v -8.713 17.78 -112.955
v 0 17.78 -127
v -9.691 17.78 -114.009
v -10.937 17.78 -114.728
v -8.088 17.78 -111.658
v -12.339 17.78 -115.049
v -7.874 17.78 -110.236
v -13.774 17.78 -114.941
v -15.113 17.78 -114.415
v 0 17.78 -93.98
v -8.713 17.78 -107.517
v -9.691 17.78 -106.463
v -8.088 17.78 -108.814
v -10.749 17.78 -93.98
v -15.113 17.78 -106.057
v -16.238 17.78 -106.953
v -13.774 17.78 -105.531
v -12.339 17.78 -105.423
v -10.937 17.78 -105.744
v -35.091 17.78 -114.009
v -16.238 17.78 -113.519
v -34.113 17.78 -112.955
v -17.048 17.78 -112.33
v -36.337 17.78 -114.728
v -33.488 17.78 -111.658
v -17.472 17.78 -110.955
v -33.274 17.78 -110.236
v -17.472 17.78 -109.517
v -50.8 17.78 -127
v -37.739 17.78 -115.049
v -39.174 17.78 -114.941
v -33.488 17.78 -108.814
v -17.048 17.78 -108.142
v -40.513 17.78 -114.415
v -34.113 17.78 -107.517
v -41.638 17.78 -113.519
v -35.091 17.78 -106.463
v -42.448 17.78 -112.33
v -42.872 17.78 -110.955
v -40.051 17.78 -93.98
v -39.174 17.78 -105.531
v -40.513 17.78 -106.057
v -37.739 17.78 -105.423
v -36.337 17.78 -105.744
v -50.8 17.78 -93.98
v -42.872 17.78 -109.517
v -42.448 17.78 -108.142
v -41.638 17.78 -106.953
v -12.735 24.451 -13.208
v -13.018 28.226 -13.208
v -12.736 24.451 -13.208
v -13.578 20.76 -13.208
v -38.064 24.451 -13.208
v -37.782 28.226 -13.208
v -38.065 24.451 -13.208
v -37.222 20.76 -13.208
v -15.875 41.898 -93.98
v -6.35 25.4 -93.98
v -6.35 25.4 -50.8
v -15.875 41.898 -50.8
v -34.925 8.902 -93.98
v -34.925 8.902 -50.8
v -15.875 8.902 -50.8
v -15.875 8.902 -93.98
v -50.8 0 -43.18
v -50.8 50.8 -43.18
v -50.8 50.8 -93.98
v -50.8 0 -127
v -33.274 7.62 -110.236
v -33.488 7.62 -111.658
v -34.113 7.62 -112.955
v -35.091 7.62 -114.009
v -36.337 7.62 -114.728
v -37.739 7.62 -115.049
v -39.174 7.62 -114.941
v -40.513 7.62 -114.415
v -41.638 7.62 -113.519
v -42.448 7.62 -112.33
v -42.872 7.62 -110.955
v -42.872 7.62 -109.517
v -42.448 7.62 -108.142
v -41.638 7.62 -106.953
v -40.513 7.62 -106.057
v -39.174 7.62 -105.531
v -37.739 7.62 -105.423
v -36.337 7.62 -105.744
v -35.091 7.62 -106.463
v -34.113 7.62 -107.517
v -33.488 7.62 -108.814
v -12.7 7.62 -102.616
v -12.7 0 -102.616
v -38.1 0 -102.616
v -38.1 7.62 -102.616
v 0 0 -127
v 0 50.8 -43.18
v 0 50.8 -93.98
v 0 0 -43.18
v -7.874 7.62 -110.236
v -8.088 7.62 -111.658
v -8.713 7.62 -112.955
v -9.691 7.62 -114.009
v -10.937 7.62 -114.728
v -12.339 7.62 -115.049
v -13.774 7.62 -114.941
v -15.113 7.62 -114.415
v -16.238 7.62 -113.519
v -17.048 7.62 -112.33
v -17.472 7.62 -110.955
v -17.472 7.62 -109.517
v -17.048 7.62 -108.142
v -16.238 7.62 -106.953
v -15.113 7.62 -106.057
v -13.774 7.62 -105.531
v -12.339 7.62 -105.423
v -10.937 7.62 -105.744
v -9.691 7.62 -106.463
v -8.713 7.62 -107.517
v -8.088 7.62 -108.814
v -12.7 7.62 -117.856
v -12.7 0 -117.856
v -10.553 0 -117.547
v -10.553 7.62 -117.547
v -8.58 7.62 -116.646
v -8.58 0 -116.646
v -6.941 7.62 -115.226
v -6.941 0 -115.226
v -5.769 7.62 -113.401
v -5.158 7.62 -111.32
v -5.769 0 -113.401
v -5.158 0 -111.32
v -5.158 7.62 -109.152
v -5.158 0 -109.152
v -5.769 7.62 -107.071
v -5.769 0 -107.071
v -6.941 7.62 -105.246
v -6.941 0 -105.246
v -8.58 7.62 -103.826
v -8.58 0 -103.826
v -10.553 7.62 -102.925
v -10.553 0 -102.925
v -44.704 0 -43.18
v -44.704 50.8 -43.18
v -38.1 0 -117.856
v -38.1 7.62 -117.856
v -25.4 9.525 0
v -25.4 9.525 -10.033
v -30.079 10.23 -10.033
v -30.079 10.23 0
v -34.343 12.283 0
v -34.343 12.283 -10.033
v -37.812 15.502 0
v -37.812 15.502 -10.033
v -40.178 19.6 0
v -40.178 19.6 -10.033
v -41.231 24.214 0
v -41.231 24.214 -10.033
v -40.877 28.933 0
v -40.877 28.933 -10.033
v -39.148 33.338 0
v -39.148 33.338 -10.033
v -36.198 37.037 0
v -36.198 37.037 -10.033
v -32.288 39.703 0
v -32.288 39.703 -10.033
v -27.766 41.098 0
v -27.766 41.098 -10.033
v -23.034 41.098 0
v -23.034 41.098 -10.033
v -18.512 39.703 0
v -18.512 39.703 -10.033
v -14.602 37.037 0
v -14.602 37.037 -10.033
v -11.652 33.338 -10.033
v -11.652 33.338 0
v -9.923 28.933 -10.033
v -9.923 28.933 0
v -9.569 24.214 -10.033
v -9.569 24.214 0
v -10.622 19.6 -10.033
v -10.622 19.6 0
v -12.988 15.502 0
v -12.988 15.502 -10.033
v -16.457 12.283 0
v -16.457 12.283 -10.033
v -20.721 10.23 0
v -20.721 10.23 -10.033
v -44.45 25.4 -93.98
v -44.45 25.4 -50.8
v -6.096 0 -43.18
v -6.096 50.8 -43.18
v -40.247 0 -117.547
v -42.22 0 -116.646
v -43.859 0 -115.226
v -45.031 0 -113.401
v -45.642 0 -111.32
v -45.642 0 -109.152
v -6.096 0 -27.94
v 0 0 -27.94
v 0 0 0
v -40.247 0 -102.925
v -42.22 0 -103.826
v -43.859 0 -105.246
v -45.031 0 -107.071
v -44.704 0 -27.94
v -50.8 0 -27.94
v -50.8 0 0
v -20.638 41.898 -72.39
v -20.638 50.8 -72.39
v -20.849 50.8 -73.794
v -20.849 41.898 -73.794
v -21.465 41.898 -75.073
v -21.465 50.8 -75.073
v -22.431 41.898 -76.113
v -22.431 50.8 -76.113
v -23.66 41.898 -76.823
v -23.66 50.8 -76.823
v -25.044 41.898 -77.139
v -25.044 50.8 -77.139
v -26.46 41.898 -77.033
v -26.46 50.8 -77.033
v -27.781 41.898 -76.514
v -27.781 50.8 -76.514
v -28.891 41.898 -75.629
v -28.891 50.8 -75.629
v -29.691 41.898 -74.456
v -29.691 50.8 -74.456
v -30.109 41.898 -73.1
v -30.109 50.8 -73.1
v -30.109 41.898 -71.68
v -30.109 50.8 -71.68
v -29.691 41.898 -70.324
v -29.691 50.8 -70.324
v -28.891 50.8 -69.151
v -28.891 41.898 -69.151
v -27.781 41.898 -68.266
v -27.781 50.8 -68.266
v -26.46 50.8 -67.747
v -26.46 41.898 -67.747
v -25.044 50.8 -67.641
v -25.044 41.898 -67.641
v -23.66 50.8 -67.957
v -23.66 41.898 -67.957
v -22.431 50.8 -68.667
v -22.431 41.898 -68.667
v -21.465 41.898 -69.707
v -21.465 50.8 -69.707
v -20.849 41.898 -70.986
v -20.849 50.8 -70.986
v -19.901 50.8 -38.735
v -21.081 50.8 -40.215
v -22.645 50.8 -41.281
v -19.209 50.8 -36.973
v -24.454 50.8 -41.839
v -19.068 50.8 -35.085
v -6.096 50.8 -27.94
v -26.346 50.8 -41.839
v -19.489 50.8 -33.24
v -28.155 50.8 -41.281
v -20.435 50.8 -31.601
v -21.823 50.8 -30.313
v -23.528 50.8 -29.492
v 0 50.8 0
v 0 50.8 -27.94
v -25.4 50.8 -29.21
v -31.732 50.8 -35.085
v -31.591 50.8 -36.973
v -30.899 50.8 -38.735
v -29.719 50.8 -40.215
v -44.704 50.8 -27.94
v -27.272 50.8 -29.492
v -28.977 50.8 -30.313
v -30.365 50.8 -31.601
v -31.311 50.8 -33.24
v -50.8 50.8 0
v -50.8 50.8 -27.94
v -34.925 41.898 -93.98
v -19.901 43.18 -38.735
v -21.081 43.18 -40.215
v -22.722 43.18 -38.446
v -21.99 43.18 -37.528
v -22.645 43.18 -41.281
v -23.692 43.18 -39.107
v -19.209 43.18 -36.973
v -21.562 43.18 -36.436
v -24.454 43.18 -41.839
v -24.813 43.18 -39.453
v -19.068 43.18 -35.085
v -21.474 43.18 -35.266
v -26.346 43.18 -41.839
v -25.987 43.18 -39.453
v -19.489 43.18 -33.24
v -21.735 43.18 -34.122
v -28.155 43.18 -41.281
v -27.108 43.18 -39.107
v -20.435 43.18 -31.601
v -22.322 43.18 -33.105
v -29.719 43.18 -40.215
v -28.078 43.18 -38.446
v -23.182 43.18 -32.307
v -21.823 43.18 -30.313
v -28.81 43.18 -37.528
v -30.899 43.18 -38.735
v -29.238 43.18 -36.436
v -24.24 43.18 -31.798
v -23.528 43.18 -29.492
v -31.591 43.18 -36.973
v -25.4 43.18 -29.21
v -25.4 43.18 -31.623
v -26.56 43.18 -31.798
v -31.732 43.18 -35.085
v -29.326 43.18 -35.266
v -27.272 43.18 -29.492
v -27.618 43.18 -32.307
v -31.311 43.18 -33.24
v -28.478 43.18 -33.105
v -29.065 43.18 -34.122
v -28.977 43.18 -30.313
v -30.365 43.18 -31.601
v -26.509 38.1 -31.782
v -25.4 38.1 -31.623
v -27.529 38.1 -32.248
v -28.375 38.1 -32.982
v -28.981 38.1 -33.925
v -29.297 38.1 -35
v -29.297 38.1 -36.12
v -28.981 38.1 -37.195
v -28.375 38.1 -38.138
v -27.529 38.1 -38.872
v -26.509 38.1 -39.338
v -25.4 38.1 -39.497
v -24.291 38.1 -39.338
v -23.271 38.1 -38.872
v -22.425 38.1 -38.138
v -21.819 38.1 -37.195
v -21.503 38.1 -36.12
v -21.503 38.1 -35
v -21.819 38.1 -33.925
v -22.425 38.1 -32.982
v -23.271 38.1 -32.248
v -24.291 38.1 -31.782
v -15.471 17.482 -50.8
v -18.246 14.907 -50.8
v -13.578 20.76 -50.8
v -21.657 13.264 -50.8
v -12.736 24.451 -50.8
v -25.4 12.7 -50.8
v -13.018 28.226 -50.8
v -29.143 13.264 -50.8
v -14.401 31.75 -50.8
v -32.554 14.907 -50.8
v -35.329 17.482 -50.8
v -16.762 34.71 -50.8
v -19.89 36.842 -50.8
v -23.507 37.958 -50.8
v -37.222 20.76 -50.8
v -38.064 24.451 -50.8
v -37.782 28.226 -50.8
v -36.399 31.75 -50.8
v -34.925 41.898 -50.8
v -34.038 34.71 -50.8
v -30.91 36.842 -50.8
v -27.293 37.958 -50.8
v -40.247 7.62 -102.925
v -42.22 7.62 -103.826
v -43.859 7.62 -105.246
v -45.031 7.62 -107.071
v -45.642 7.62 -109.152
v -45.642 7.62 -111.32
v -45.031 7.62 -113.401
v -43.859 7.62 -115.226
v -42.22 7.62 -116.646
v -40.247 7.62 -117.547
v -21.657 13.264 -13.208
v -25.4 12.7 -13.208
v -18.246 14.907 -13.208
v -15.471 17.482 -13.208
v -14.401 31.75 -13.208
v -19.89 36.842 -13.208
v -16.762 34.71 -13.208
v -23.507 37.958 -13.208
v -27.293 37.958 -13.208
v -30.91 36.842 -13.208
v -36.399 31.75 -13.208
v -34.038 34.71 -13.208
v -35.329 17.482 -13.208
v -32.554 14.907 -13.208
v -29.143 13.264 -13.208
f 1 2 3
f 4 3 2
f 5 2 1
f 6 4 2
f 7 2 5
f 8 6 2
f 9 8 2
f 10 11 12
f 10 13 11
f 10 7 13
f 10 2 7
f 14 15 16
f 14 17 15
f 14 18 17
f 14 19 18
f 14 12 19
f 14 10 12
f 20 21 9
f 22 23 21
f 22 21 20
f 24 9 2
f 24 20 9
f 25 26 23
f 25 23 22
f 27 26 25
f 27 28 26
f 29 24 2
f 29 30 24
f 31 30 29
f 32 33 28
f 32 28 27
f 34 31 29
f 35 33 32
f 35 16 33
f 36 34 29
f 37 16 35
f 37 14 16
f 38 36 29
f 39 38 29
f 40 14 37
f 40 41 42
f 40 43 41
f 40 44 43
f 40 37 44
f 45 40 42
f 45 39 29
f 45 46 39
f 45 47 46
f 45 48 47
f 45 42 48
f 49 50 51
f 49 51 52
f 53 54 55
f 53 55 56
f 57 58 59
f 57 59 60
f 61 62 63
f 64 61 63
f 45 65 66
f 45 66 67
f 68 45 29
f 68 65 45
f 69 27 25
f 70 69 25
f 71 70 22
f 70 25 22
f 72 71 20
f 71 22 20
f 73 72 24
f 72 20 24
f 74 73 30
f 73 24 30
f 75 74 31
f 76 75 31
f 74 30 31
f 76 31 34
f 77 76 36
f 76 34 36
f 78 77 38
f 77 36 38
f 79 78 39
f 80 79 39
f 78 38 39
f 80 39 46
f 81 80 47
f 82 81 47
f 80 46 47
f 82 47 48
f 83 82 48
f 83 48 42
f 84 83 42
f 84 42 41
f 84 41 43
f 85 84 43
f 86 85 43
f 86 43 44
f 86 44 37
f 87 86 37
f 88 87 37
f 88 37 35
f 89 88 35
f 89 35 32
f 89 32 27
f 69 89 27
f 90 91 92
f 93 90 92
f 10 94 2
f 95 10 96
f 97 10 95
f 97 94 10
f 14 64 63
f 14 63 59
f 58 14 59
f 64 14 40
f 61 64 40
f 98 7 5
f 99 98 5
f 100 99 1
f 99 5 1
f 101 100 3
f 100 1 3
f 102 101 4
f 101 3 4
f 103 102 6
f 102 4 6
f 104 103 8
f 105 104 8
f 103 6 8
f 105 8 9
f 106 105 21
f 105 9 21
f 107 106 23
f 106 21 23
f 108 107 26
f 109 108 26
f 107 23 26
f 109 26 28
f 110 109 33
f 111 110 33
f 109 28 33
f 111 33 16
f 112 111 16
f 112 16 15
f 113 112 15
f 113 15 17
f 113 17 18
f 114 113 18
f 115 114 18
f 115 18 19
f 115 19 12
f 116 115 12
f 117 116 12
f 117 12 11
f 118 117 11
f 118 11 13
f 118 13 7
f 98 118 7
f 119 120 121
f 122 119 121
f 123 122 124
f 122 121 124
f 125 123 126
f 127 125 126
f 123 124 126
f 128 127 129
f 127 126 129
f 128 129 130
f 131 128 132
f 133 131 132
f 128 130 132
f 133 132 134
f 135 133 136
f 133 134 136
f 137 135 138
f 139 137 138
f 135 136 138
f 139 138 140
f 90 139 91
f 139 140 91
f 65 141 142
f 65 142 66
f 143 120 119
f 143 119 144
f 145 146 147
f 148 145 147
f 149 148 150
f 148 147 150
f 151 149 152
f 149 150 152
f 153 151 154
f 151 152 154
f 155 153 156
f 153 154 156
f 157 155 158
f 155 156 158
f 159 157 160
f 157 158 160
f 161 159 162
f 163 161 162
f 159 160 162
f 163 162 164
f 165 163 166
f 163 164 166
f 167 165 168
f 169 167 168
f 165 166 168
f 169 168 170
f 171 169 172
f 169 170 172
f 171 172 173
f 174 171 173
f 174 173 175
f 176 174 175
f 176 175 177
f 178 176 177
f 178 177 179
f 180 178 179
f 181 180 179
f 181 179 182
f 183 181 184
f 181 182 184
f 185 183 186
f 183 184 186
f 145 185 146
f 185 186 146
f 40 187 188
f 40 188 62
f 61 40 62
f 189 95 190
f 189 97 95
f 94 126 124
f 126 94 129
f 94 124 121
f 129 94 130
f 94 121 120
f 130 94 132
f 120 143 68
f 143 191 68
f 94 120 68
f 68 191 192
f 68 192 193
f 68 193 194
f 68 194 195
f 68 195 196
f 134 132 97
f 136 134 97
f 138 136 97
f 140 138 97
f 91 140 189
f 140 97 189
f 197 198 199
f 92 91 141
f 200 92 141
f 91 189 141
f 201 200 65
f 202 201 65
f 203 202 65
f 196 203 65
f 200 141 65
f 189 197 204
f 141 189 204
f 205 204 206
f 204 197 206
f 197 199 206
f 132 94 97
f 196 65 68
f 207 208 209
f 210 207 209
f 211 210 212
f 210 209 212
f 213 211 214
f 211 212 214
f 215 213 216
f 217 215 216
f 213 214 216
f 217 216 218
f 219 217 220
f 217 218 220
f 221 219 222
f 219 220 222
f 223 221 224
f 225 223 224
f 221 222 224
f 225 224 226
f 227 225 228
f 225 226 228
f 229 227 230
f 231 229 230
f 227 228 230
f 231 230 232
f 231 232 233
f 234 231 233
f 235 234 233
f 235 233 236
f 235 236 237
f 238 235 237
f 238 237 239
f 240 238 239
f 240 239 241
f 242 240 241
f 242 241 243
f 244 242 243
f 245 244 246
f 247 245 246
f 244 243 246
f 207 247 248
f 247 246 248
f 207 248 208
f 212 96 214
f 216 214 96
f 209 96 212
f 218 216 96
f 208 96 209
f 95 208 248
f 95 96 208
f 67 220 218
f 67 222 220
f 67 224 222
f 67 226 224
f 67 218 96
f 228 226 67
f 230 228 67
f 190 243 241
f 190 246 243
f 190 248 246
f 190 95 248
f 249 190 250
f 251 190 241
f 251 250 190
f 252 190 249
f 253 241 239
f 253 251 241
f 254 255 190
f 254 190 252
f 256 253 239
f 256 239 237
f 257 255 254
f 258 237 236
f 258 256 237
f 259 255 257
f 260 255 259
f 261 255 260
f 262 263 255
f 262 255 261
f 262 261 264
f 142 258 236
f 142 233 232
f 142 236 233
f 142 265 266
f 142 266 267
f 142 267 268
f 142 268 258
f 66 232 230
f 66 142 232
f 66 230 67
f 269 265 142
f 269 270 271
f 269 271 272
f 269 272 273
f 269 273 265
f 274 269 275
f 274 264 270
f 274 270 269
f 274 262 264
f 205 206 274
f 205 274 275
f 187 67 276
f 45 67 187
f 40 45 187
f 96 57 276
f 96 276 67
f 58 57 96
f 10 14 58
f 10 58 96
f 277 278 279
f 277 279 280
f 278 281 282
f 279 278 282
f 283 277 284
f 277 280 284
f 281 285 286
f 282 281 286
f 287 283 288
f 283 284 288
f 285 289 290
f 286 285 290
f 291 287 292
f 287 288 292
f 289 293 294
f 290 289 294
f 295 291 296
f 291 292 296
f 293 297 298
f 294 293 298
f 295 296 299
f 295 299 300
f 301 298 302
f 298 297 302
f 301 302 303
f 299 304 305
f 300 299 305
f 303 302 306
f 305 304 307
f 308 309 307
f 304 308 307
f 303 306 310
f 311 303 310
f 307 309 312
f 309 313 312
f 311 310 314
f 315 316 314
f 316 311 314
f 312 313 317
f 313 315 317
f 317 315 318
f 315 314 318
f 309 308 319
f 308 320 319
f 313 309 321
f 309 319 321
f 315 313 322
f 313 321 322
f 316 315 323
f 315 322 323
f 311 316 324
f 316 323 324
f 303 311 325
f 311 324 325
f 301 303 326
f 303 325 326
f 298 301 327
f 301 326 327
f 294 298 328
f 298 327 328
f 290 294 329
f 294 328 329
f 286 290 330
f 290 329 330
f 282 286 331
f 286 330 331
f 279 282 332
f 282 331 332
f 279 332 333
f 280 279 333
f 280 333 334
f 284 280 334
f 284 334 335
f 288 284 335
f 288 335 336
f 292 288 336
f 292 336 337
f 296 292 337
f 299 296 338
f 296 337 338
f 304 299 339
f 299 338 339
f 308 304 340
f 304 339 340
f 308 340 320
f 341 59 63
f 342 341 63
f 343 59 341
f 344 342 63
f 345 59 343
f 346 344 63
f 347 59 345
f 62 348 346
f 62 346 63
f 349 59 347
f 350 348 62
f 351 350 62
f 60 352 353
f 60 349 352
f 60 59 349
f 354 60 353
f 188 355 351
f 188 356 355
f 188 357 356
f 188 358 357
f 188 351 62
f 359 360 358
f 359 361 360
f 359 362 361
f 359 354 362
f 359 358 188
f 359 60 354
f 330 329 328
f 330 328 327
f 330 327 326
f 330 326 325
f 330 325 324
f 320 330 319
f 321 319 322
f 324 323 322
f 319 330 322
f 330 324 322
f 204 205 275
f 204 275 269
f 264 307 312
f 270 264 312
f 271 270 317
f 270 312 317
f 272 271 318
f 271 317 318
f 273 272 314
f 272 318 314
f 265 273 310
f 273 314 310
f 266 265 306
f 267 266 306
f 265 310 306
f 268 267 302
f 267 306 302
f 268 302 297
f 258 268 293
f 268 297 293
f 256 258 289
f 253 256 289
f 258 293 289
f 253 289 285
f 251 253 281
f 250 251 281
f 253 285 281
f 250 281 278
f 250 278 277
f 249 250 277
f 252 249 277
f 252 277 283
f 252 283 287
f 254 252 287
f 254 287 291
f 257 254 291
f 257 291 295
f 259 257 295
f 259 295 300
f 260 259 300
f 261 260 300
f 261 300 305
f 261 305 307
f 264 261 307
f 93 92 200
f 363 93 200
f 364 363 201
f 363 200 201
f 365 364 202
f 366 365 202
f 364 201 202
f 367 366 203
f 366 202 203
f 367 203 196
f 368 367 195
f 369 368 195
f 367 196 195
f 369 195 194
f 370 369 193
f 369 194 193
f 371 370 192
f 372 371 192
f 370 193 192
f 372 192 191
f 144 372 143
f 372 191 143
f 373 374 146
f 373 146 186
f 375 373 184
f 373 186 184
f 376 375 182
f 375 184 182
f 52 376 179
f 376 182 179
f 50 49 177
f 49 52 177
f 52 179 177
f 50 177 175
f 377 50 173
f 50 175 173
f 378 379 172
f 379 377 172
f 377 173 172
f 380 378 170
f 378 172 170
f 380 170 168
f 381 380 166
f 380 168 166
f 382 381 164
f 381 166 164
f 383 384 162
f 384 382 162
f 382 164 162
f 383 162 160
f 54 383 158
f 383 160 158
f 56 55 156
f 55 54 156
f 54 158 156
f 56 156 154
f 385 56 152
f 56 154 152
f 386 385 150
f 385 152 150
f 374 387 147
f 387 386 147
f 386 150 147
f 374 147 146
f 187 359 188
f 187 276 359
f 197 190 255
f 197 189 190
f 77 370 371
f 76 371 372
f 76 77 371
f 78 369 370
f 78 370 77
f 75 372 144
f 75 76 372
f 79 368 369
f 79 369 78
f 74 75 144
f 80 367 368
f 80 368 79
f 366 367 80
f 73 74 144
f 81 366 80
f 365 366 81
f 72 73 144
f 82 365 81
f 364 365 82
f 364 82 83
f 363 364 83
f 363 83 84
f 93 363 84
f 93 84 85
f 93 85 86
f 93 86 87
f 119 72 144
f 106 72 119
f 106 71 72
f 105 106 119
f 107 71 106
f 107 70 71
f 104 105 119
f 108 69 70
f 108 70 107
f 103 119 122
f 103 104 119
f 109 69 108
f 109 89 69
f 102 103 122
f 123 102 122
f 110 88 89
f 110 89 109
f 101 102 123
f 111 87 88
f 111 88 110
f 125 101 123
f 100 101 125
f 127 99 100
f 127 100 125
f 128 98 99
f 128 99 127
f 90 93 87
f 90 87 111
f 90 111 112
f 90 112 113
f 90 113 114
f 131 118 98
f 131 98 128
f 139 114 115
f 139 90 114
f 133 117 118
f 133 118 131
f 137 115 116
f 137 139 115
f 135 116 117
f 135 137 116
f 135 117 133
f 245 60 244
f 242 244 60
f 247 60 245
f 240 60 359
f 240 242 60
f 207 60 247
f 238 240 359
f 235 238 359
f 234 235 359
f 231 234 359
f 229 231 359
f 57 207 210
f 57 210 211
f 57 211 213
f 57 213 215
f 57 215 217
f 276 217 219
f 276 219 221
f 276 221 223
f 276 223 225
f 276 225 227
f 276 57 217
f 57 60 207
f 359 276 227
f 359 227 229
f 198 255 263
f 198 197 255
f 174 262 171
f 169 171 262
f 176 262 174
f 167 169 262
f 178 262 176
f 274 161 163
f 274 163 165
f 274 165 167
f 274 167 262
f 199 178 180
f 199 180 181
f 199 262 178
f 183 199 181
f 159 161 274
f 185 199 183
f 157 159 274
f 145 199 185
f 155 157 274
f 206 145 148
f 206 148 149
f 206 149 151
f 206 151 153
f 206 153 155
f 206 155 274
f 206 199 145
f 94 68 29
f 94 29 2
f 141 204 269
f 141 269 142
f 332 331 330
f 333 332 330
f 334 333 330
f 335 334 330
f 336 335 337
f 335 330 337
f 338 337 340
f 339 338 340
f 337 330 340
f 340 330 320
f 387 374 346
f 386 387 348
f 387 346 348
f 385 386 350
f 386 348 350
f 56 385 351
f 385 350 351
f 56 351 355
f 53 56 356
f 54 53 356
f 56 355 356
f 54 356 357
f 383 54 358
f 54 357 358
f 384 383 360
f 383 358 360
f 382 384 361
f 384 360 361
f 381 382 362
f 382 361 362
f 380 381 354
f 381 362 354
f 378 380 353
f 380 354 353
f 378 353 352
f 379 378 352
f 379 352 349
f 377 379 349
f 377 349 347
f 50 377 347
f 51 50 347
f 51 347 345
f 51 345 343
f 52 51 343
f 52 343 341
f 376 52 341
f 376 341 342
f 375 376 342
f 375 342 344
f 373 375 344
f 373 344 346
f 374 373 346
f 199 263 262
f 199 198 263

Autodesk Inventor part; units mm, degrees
ref_plane "YZ Plane" through (0, 0, 0) normal (1, 0, 0) x (0, 1, 0)
ref_plane "XZ Plane" through (0, 0, 0) normal (0, 1, 0) x (-1, 0, 0)
ref_plane "XY Plane" through (0, 0, 0) normal (0, 0, 1) x (1, 0, 0)
sketch "Boceto1" plane through (0, 0, 0) normal (0, 1, 0) x (-1, 0, 0)
  line L0 (0, 0) -> (50.8, 0)
  line L1 (50.8, -93.98) -> (0, -93.98)
  line L2 (50.8, -27.94) -> (44.704, -27.94)
  line L3 (44.704, -27.94) -> (44.704, -43.18)
  line L4 (44.704, -43.18) -> (50.8, -43.18)
  line L5 (6.096, -27.94) -> (0, -27.94)
  line L6 (0, -43.18) -> (6.096, -43.18)
  line L7 (6.096, -43.18) -> (6.096, -27.94)
  line L8 (50.8, 0) -> (50.8, -27.94)
  line L9 (50.8, -43.18) -> (50.8, -93.98)
  line L10 (0, -93.98) -> (0, -43.18)
  line L11 (0, -27.94) -> (0, 0)
  dimension "d0" = 50.8
  dimension "d1" = 93.98
  dimension "d2" = 27.94
  dimension "d3" = 15.24
  dimension "d5" = 27.94
  dimension "d6" = 15.24
extrude "BaseAlta" add sketch "Boceto1" along normal blind 50.8
sketch "Boceto2" plane through (0, 0, 0) normal (0, 1, 0) x (-1, 0, 0)
  line L0 (0, -93.98) -> (50.8, -93.98) projected
  line L1 (0, -93.98) -> (50.8, -93.98)
  line L2 (50.8, -93.98) -> (50.8, -127)
  line L3 (50.8, -127) -> (0, -127)
  line L4 (0, -127) -> (0, -93.98)
  point P0 (0, 0)
  dimension "d10" = 50.8
  dimension "d11" = 33.02
extrude "BaseBaja" add sketch "Boceto2" along normal blind 17.78
sketch "Boceto4" plane through (0, 50.8, -93.98) normal (0, 0, -1) x (-1, 0, 0)
  circle A0 centre (25.4, -25.4) radius 19.05 construction
  line L0 (0, -50.8) -> (50.8, -50.8) construction
  line L1 (0, -33.02) -> (0, 0) construction
  line L2 (6.35, -25.4) -> (15.875, -8.9022)
  line L3 (15.875, -8.9022) -> (34.925, -8.9022)
  line L4 (34.925, -8.9022) -> (44.45, -25.4)
  line L5 (44.45, -25.4) -> (34.925, -41.8978)
  line L6 (34.925, -41.8978) -> (15.875, -41.8978)
  line L7 (15.875, -41.8978) -> (6.35, -25.4)
  dimension "d19" = 38.1
  dimension "d20" = 25.4
  dimension "d21" = 25.4
extrude "Hexagono" cut sketch "Boceto4" against normal blind 43.18
sketch "Boceto6" plane through (0, 17.78, 0) normal (0, 1, 0) x (1, 0, 0)
  circle A0 centre (-38.1, 110.236) radius 4.826
  circle A1 centre (-12.7, 110.236) radius 4.826
  line L0 (0, 127) -> (-50.8, 127) projected
  line L1 (-50.8, 127) -> (-50.8, 93.98) projected
  line L2 (0, 93.98) -> (0, 127) projected
  point P0 (0, 0)
  dimension "d35" = 9.652
  dimension "d36" = 9.652
  dimension "d37" = 16.764
  dimension "d38" = 16.764
  dimension "d39" = 12.7
  dimension "d40" = 12.7
  dimension "d41" = 25.4
extrude "DosAgujeros" cut sketch "Boceto6" against normal blind 10.16
sketch "Boceto7" plane through (0, 0, 0) normal (0, -1, 0) x (1, 0, 0)
  circle A0 centre (-12.7, -110.236) radius 4.826 construction
  circle A1 centre (-38.1, -110.236) radius 4.826 construction
  arc A2 (-12.7, -117.856) -> (-12.7, -102.616) centre (-12.7, -110.236) ccw
  arc A3 (-38.1, -102.616) -> (-38.1, -117.856) centre (-38.1, -110.236) ccw
  line L0 (-12.7, -117.856) -> (-38.1, -117.856)
  line L1 (-12.7, -102.616) -> (-38.1, -102.616)
  line L2 (0, -43.18) -> (0, -127) projected
  line L3 (0, -127) -> (-50.8, -127) projected
  line L4 (-50.8, -127) -> (-50.8, -43.18) projected
  point P0 (0, 0)
  dimension "d44" = 15.24
  dimension "d45" = 15.24
  dimension "d46" = 12.7
  dimension "d47" = 16.764
  dimension "d48" = 12.7
  dimension "d49" = 16.764
extrude "AgujeroInferior" cut sketch "Boceto7" against normal blind 7.62
sketch "Boceto8" plane through (-50.8, 0, 0) normal (0, 0, 1) x (1, 0, 0)
  line L0 (0, 0) -> (50.8, 0) projected
  line L1 (0, 0) -> (0, 50.8) projected
  point P0 (25.4, 25.4)
  dimension "d52" = 25.4
  dimension "d53" = 25.4
hole "Agujero" at (-25.4, 25.4, 0) direction (0, 0, -1) diameter 25.4 depth 50.8 tip angle 118 counterbore diameter 31.75 counterbore depth 13.208
sketch "Boceto9" plane through (0, 50.8, 0) normal (0, 1, 0) x (1, 0, 0)
  circle A0 centre (-25.4, 72.39) radius 4.7625
  line L0 (-50.8, 93.98) -> (-50.8, 43.18) projected
  line L1 (0, 93.98) -> (-50.8, 93.98) projected
  point P0 (0, 0)
  dimension "d61" = 9.525
  dimension "d62" = 25.4
  dimension "d63" = 21.59
extrude "HoyoSuperior" cut sketch "Boceto9" against normal blind 12.7
sketch "Boceto10" plane through (0, 50.8, 0) normal (0, 1, 0) x (1, 0, 0)
  line L0 (-50.8, 27.94) -> (-50.8, 0) projected
  line L1 (-50.8, 0) -> (0, 0) projected
  point P0 (-25.4, 35.56)
  dimension "d66" = 25.4
  dimension "d67" = 35.56
hole "Agujero3" at (-25.4, 50.8, -35.56) direction (0, -1, 0) diameter 7.874 depth 12.7 counterbore diameter 12.7 counterbore depth 7.62
chamfer "Chaflán1" distance 3.175 angle 45 1 edges at (-25.4, 41.275, -13.208) measured on face at (-24.1336, 10.7371, -13.208)
equation "\"d38\" = d37"
properties part number "Box A01209499"
